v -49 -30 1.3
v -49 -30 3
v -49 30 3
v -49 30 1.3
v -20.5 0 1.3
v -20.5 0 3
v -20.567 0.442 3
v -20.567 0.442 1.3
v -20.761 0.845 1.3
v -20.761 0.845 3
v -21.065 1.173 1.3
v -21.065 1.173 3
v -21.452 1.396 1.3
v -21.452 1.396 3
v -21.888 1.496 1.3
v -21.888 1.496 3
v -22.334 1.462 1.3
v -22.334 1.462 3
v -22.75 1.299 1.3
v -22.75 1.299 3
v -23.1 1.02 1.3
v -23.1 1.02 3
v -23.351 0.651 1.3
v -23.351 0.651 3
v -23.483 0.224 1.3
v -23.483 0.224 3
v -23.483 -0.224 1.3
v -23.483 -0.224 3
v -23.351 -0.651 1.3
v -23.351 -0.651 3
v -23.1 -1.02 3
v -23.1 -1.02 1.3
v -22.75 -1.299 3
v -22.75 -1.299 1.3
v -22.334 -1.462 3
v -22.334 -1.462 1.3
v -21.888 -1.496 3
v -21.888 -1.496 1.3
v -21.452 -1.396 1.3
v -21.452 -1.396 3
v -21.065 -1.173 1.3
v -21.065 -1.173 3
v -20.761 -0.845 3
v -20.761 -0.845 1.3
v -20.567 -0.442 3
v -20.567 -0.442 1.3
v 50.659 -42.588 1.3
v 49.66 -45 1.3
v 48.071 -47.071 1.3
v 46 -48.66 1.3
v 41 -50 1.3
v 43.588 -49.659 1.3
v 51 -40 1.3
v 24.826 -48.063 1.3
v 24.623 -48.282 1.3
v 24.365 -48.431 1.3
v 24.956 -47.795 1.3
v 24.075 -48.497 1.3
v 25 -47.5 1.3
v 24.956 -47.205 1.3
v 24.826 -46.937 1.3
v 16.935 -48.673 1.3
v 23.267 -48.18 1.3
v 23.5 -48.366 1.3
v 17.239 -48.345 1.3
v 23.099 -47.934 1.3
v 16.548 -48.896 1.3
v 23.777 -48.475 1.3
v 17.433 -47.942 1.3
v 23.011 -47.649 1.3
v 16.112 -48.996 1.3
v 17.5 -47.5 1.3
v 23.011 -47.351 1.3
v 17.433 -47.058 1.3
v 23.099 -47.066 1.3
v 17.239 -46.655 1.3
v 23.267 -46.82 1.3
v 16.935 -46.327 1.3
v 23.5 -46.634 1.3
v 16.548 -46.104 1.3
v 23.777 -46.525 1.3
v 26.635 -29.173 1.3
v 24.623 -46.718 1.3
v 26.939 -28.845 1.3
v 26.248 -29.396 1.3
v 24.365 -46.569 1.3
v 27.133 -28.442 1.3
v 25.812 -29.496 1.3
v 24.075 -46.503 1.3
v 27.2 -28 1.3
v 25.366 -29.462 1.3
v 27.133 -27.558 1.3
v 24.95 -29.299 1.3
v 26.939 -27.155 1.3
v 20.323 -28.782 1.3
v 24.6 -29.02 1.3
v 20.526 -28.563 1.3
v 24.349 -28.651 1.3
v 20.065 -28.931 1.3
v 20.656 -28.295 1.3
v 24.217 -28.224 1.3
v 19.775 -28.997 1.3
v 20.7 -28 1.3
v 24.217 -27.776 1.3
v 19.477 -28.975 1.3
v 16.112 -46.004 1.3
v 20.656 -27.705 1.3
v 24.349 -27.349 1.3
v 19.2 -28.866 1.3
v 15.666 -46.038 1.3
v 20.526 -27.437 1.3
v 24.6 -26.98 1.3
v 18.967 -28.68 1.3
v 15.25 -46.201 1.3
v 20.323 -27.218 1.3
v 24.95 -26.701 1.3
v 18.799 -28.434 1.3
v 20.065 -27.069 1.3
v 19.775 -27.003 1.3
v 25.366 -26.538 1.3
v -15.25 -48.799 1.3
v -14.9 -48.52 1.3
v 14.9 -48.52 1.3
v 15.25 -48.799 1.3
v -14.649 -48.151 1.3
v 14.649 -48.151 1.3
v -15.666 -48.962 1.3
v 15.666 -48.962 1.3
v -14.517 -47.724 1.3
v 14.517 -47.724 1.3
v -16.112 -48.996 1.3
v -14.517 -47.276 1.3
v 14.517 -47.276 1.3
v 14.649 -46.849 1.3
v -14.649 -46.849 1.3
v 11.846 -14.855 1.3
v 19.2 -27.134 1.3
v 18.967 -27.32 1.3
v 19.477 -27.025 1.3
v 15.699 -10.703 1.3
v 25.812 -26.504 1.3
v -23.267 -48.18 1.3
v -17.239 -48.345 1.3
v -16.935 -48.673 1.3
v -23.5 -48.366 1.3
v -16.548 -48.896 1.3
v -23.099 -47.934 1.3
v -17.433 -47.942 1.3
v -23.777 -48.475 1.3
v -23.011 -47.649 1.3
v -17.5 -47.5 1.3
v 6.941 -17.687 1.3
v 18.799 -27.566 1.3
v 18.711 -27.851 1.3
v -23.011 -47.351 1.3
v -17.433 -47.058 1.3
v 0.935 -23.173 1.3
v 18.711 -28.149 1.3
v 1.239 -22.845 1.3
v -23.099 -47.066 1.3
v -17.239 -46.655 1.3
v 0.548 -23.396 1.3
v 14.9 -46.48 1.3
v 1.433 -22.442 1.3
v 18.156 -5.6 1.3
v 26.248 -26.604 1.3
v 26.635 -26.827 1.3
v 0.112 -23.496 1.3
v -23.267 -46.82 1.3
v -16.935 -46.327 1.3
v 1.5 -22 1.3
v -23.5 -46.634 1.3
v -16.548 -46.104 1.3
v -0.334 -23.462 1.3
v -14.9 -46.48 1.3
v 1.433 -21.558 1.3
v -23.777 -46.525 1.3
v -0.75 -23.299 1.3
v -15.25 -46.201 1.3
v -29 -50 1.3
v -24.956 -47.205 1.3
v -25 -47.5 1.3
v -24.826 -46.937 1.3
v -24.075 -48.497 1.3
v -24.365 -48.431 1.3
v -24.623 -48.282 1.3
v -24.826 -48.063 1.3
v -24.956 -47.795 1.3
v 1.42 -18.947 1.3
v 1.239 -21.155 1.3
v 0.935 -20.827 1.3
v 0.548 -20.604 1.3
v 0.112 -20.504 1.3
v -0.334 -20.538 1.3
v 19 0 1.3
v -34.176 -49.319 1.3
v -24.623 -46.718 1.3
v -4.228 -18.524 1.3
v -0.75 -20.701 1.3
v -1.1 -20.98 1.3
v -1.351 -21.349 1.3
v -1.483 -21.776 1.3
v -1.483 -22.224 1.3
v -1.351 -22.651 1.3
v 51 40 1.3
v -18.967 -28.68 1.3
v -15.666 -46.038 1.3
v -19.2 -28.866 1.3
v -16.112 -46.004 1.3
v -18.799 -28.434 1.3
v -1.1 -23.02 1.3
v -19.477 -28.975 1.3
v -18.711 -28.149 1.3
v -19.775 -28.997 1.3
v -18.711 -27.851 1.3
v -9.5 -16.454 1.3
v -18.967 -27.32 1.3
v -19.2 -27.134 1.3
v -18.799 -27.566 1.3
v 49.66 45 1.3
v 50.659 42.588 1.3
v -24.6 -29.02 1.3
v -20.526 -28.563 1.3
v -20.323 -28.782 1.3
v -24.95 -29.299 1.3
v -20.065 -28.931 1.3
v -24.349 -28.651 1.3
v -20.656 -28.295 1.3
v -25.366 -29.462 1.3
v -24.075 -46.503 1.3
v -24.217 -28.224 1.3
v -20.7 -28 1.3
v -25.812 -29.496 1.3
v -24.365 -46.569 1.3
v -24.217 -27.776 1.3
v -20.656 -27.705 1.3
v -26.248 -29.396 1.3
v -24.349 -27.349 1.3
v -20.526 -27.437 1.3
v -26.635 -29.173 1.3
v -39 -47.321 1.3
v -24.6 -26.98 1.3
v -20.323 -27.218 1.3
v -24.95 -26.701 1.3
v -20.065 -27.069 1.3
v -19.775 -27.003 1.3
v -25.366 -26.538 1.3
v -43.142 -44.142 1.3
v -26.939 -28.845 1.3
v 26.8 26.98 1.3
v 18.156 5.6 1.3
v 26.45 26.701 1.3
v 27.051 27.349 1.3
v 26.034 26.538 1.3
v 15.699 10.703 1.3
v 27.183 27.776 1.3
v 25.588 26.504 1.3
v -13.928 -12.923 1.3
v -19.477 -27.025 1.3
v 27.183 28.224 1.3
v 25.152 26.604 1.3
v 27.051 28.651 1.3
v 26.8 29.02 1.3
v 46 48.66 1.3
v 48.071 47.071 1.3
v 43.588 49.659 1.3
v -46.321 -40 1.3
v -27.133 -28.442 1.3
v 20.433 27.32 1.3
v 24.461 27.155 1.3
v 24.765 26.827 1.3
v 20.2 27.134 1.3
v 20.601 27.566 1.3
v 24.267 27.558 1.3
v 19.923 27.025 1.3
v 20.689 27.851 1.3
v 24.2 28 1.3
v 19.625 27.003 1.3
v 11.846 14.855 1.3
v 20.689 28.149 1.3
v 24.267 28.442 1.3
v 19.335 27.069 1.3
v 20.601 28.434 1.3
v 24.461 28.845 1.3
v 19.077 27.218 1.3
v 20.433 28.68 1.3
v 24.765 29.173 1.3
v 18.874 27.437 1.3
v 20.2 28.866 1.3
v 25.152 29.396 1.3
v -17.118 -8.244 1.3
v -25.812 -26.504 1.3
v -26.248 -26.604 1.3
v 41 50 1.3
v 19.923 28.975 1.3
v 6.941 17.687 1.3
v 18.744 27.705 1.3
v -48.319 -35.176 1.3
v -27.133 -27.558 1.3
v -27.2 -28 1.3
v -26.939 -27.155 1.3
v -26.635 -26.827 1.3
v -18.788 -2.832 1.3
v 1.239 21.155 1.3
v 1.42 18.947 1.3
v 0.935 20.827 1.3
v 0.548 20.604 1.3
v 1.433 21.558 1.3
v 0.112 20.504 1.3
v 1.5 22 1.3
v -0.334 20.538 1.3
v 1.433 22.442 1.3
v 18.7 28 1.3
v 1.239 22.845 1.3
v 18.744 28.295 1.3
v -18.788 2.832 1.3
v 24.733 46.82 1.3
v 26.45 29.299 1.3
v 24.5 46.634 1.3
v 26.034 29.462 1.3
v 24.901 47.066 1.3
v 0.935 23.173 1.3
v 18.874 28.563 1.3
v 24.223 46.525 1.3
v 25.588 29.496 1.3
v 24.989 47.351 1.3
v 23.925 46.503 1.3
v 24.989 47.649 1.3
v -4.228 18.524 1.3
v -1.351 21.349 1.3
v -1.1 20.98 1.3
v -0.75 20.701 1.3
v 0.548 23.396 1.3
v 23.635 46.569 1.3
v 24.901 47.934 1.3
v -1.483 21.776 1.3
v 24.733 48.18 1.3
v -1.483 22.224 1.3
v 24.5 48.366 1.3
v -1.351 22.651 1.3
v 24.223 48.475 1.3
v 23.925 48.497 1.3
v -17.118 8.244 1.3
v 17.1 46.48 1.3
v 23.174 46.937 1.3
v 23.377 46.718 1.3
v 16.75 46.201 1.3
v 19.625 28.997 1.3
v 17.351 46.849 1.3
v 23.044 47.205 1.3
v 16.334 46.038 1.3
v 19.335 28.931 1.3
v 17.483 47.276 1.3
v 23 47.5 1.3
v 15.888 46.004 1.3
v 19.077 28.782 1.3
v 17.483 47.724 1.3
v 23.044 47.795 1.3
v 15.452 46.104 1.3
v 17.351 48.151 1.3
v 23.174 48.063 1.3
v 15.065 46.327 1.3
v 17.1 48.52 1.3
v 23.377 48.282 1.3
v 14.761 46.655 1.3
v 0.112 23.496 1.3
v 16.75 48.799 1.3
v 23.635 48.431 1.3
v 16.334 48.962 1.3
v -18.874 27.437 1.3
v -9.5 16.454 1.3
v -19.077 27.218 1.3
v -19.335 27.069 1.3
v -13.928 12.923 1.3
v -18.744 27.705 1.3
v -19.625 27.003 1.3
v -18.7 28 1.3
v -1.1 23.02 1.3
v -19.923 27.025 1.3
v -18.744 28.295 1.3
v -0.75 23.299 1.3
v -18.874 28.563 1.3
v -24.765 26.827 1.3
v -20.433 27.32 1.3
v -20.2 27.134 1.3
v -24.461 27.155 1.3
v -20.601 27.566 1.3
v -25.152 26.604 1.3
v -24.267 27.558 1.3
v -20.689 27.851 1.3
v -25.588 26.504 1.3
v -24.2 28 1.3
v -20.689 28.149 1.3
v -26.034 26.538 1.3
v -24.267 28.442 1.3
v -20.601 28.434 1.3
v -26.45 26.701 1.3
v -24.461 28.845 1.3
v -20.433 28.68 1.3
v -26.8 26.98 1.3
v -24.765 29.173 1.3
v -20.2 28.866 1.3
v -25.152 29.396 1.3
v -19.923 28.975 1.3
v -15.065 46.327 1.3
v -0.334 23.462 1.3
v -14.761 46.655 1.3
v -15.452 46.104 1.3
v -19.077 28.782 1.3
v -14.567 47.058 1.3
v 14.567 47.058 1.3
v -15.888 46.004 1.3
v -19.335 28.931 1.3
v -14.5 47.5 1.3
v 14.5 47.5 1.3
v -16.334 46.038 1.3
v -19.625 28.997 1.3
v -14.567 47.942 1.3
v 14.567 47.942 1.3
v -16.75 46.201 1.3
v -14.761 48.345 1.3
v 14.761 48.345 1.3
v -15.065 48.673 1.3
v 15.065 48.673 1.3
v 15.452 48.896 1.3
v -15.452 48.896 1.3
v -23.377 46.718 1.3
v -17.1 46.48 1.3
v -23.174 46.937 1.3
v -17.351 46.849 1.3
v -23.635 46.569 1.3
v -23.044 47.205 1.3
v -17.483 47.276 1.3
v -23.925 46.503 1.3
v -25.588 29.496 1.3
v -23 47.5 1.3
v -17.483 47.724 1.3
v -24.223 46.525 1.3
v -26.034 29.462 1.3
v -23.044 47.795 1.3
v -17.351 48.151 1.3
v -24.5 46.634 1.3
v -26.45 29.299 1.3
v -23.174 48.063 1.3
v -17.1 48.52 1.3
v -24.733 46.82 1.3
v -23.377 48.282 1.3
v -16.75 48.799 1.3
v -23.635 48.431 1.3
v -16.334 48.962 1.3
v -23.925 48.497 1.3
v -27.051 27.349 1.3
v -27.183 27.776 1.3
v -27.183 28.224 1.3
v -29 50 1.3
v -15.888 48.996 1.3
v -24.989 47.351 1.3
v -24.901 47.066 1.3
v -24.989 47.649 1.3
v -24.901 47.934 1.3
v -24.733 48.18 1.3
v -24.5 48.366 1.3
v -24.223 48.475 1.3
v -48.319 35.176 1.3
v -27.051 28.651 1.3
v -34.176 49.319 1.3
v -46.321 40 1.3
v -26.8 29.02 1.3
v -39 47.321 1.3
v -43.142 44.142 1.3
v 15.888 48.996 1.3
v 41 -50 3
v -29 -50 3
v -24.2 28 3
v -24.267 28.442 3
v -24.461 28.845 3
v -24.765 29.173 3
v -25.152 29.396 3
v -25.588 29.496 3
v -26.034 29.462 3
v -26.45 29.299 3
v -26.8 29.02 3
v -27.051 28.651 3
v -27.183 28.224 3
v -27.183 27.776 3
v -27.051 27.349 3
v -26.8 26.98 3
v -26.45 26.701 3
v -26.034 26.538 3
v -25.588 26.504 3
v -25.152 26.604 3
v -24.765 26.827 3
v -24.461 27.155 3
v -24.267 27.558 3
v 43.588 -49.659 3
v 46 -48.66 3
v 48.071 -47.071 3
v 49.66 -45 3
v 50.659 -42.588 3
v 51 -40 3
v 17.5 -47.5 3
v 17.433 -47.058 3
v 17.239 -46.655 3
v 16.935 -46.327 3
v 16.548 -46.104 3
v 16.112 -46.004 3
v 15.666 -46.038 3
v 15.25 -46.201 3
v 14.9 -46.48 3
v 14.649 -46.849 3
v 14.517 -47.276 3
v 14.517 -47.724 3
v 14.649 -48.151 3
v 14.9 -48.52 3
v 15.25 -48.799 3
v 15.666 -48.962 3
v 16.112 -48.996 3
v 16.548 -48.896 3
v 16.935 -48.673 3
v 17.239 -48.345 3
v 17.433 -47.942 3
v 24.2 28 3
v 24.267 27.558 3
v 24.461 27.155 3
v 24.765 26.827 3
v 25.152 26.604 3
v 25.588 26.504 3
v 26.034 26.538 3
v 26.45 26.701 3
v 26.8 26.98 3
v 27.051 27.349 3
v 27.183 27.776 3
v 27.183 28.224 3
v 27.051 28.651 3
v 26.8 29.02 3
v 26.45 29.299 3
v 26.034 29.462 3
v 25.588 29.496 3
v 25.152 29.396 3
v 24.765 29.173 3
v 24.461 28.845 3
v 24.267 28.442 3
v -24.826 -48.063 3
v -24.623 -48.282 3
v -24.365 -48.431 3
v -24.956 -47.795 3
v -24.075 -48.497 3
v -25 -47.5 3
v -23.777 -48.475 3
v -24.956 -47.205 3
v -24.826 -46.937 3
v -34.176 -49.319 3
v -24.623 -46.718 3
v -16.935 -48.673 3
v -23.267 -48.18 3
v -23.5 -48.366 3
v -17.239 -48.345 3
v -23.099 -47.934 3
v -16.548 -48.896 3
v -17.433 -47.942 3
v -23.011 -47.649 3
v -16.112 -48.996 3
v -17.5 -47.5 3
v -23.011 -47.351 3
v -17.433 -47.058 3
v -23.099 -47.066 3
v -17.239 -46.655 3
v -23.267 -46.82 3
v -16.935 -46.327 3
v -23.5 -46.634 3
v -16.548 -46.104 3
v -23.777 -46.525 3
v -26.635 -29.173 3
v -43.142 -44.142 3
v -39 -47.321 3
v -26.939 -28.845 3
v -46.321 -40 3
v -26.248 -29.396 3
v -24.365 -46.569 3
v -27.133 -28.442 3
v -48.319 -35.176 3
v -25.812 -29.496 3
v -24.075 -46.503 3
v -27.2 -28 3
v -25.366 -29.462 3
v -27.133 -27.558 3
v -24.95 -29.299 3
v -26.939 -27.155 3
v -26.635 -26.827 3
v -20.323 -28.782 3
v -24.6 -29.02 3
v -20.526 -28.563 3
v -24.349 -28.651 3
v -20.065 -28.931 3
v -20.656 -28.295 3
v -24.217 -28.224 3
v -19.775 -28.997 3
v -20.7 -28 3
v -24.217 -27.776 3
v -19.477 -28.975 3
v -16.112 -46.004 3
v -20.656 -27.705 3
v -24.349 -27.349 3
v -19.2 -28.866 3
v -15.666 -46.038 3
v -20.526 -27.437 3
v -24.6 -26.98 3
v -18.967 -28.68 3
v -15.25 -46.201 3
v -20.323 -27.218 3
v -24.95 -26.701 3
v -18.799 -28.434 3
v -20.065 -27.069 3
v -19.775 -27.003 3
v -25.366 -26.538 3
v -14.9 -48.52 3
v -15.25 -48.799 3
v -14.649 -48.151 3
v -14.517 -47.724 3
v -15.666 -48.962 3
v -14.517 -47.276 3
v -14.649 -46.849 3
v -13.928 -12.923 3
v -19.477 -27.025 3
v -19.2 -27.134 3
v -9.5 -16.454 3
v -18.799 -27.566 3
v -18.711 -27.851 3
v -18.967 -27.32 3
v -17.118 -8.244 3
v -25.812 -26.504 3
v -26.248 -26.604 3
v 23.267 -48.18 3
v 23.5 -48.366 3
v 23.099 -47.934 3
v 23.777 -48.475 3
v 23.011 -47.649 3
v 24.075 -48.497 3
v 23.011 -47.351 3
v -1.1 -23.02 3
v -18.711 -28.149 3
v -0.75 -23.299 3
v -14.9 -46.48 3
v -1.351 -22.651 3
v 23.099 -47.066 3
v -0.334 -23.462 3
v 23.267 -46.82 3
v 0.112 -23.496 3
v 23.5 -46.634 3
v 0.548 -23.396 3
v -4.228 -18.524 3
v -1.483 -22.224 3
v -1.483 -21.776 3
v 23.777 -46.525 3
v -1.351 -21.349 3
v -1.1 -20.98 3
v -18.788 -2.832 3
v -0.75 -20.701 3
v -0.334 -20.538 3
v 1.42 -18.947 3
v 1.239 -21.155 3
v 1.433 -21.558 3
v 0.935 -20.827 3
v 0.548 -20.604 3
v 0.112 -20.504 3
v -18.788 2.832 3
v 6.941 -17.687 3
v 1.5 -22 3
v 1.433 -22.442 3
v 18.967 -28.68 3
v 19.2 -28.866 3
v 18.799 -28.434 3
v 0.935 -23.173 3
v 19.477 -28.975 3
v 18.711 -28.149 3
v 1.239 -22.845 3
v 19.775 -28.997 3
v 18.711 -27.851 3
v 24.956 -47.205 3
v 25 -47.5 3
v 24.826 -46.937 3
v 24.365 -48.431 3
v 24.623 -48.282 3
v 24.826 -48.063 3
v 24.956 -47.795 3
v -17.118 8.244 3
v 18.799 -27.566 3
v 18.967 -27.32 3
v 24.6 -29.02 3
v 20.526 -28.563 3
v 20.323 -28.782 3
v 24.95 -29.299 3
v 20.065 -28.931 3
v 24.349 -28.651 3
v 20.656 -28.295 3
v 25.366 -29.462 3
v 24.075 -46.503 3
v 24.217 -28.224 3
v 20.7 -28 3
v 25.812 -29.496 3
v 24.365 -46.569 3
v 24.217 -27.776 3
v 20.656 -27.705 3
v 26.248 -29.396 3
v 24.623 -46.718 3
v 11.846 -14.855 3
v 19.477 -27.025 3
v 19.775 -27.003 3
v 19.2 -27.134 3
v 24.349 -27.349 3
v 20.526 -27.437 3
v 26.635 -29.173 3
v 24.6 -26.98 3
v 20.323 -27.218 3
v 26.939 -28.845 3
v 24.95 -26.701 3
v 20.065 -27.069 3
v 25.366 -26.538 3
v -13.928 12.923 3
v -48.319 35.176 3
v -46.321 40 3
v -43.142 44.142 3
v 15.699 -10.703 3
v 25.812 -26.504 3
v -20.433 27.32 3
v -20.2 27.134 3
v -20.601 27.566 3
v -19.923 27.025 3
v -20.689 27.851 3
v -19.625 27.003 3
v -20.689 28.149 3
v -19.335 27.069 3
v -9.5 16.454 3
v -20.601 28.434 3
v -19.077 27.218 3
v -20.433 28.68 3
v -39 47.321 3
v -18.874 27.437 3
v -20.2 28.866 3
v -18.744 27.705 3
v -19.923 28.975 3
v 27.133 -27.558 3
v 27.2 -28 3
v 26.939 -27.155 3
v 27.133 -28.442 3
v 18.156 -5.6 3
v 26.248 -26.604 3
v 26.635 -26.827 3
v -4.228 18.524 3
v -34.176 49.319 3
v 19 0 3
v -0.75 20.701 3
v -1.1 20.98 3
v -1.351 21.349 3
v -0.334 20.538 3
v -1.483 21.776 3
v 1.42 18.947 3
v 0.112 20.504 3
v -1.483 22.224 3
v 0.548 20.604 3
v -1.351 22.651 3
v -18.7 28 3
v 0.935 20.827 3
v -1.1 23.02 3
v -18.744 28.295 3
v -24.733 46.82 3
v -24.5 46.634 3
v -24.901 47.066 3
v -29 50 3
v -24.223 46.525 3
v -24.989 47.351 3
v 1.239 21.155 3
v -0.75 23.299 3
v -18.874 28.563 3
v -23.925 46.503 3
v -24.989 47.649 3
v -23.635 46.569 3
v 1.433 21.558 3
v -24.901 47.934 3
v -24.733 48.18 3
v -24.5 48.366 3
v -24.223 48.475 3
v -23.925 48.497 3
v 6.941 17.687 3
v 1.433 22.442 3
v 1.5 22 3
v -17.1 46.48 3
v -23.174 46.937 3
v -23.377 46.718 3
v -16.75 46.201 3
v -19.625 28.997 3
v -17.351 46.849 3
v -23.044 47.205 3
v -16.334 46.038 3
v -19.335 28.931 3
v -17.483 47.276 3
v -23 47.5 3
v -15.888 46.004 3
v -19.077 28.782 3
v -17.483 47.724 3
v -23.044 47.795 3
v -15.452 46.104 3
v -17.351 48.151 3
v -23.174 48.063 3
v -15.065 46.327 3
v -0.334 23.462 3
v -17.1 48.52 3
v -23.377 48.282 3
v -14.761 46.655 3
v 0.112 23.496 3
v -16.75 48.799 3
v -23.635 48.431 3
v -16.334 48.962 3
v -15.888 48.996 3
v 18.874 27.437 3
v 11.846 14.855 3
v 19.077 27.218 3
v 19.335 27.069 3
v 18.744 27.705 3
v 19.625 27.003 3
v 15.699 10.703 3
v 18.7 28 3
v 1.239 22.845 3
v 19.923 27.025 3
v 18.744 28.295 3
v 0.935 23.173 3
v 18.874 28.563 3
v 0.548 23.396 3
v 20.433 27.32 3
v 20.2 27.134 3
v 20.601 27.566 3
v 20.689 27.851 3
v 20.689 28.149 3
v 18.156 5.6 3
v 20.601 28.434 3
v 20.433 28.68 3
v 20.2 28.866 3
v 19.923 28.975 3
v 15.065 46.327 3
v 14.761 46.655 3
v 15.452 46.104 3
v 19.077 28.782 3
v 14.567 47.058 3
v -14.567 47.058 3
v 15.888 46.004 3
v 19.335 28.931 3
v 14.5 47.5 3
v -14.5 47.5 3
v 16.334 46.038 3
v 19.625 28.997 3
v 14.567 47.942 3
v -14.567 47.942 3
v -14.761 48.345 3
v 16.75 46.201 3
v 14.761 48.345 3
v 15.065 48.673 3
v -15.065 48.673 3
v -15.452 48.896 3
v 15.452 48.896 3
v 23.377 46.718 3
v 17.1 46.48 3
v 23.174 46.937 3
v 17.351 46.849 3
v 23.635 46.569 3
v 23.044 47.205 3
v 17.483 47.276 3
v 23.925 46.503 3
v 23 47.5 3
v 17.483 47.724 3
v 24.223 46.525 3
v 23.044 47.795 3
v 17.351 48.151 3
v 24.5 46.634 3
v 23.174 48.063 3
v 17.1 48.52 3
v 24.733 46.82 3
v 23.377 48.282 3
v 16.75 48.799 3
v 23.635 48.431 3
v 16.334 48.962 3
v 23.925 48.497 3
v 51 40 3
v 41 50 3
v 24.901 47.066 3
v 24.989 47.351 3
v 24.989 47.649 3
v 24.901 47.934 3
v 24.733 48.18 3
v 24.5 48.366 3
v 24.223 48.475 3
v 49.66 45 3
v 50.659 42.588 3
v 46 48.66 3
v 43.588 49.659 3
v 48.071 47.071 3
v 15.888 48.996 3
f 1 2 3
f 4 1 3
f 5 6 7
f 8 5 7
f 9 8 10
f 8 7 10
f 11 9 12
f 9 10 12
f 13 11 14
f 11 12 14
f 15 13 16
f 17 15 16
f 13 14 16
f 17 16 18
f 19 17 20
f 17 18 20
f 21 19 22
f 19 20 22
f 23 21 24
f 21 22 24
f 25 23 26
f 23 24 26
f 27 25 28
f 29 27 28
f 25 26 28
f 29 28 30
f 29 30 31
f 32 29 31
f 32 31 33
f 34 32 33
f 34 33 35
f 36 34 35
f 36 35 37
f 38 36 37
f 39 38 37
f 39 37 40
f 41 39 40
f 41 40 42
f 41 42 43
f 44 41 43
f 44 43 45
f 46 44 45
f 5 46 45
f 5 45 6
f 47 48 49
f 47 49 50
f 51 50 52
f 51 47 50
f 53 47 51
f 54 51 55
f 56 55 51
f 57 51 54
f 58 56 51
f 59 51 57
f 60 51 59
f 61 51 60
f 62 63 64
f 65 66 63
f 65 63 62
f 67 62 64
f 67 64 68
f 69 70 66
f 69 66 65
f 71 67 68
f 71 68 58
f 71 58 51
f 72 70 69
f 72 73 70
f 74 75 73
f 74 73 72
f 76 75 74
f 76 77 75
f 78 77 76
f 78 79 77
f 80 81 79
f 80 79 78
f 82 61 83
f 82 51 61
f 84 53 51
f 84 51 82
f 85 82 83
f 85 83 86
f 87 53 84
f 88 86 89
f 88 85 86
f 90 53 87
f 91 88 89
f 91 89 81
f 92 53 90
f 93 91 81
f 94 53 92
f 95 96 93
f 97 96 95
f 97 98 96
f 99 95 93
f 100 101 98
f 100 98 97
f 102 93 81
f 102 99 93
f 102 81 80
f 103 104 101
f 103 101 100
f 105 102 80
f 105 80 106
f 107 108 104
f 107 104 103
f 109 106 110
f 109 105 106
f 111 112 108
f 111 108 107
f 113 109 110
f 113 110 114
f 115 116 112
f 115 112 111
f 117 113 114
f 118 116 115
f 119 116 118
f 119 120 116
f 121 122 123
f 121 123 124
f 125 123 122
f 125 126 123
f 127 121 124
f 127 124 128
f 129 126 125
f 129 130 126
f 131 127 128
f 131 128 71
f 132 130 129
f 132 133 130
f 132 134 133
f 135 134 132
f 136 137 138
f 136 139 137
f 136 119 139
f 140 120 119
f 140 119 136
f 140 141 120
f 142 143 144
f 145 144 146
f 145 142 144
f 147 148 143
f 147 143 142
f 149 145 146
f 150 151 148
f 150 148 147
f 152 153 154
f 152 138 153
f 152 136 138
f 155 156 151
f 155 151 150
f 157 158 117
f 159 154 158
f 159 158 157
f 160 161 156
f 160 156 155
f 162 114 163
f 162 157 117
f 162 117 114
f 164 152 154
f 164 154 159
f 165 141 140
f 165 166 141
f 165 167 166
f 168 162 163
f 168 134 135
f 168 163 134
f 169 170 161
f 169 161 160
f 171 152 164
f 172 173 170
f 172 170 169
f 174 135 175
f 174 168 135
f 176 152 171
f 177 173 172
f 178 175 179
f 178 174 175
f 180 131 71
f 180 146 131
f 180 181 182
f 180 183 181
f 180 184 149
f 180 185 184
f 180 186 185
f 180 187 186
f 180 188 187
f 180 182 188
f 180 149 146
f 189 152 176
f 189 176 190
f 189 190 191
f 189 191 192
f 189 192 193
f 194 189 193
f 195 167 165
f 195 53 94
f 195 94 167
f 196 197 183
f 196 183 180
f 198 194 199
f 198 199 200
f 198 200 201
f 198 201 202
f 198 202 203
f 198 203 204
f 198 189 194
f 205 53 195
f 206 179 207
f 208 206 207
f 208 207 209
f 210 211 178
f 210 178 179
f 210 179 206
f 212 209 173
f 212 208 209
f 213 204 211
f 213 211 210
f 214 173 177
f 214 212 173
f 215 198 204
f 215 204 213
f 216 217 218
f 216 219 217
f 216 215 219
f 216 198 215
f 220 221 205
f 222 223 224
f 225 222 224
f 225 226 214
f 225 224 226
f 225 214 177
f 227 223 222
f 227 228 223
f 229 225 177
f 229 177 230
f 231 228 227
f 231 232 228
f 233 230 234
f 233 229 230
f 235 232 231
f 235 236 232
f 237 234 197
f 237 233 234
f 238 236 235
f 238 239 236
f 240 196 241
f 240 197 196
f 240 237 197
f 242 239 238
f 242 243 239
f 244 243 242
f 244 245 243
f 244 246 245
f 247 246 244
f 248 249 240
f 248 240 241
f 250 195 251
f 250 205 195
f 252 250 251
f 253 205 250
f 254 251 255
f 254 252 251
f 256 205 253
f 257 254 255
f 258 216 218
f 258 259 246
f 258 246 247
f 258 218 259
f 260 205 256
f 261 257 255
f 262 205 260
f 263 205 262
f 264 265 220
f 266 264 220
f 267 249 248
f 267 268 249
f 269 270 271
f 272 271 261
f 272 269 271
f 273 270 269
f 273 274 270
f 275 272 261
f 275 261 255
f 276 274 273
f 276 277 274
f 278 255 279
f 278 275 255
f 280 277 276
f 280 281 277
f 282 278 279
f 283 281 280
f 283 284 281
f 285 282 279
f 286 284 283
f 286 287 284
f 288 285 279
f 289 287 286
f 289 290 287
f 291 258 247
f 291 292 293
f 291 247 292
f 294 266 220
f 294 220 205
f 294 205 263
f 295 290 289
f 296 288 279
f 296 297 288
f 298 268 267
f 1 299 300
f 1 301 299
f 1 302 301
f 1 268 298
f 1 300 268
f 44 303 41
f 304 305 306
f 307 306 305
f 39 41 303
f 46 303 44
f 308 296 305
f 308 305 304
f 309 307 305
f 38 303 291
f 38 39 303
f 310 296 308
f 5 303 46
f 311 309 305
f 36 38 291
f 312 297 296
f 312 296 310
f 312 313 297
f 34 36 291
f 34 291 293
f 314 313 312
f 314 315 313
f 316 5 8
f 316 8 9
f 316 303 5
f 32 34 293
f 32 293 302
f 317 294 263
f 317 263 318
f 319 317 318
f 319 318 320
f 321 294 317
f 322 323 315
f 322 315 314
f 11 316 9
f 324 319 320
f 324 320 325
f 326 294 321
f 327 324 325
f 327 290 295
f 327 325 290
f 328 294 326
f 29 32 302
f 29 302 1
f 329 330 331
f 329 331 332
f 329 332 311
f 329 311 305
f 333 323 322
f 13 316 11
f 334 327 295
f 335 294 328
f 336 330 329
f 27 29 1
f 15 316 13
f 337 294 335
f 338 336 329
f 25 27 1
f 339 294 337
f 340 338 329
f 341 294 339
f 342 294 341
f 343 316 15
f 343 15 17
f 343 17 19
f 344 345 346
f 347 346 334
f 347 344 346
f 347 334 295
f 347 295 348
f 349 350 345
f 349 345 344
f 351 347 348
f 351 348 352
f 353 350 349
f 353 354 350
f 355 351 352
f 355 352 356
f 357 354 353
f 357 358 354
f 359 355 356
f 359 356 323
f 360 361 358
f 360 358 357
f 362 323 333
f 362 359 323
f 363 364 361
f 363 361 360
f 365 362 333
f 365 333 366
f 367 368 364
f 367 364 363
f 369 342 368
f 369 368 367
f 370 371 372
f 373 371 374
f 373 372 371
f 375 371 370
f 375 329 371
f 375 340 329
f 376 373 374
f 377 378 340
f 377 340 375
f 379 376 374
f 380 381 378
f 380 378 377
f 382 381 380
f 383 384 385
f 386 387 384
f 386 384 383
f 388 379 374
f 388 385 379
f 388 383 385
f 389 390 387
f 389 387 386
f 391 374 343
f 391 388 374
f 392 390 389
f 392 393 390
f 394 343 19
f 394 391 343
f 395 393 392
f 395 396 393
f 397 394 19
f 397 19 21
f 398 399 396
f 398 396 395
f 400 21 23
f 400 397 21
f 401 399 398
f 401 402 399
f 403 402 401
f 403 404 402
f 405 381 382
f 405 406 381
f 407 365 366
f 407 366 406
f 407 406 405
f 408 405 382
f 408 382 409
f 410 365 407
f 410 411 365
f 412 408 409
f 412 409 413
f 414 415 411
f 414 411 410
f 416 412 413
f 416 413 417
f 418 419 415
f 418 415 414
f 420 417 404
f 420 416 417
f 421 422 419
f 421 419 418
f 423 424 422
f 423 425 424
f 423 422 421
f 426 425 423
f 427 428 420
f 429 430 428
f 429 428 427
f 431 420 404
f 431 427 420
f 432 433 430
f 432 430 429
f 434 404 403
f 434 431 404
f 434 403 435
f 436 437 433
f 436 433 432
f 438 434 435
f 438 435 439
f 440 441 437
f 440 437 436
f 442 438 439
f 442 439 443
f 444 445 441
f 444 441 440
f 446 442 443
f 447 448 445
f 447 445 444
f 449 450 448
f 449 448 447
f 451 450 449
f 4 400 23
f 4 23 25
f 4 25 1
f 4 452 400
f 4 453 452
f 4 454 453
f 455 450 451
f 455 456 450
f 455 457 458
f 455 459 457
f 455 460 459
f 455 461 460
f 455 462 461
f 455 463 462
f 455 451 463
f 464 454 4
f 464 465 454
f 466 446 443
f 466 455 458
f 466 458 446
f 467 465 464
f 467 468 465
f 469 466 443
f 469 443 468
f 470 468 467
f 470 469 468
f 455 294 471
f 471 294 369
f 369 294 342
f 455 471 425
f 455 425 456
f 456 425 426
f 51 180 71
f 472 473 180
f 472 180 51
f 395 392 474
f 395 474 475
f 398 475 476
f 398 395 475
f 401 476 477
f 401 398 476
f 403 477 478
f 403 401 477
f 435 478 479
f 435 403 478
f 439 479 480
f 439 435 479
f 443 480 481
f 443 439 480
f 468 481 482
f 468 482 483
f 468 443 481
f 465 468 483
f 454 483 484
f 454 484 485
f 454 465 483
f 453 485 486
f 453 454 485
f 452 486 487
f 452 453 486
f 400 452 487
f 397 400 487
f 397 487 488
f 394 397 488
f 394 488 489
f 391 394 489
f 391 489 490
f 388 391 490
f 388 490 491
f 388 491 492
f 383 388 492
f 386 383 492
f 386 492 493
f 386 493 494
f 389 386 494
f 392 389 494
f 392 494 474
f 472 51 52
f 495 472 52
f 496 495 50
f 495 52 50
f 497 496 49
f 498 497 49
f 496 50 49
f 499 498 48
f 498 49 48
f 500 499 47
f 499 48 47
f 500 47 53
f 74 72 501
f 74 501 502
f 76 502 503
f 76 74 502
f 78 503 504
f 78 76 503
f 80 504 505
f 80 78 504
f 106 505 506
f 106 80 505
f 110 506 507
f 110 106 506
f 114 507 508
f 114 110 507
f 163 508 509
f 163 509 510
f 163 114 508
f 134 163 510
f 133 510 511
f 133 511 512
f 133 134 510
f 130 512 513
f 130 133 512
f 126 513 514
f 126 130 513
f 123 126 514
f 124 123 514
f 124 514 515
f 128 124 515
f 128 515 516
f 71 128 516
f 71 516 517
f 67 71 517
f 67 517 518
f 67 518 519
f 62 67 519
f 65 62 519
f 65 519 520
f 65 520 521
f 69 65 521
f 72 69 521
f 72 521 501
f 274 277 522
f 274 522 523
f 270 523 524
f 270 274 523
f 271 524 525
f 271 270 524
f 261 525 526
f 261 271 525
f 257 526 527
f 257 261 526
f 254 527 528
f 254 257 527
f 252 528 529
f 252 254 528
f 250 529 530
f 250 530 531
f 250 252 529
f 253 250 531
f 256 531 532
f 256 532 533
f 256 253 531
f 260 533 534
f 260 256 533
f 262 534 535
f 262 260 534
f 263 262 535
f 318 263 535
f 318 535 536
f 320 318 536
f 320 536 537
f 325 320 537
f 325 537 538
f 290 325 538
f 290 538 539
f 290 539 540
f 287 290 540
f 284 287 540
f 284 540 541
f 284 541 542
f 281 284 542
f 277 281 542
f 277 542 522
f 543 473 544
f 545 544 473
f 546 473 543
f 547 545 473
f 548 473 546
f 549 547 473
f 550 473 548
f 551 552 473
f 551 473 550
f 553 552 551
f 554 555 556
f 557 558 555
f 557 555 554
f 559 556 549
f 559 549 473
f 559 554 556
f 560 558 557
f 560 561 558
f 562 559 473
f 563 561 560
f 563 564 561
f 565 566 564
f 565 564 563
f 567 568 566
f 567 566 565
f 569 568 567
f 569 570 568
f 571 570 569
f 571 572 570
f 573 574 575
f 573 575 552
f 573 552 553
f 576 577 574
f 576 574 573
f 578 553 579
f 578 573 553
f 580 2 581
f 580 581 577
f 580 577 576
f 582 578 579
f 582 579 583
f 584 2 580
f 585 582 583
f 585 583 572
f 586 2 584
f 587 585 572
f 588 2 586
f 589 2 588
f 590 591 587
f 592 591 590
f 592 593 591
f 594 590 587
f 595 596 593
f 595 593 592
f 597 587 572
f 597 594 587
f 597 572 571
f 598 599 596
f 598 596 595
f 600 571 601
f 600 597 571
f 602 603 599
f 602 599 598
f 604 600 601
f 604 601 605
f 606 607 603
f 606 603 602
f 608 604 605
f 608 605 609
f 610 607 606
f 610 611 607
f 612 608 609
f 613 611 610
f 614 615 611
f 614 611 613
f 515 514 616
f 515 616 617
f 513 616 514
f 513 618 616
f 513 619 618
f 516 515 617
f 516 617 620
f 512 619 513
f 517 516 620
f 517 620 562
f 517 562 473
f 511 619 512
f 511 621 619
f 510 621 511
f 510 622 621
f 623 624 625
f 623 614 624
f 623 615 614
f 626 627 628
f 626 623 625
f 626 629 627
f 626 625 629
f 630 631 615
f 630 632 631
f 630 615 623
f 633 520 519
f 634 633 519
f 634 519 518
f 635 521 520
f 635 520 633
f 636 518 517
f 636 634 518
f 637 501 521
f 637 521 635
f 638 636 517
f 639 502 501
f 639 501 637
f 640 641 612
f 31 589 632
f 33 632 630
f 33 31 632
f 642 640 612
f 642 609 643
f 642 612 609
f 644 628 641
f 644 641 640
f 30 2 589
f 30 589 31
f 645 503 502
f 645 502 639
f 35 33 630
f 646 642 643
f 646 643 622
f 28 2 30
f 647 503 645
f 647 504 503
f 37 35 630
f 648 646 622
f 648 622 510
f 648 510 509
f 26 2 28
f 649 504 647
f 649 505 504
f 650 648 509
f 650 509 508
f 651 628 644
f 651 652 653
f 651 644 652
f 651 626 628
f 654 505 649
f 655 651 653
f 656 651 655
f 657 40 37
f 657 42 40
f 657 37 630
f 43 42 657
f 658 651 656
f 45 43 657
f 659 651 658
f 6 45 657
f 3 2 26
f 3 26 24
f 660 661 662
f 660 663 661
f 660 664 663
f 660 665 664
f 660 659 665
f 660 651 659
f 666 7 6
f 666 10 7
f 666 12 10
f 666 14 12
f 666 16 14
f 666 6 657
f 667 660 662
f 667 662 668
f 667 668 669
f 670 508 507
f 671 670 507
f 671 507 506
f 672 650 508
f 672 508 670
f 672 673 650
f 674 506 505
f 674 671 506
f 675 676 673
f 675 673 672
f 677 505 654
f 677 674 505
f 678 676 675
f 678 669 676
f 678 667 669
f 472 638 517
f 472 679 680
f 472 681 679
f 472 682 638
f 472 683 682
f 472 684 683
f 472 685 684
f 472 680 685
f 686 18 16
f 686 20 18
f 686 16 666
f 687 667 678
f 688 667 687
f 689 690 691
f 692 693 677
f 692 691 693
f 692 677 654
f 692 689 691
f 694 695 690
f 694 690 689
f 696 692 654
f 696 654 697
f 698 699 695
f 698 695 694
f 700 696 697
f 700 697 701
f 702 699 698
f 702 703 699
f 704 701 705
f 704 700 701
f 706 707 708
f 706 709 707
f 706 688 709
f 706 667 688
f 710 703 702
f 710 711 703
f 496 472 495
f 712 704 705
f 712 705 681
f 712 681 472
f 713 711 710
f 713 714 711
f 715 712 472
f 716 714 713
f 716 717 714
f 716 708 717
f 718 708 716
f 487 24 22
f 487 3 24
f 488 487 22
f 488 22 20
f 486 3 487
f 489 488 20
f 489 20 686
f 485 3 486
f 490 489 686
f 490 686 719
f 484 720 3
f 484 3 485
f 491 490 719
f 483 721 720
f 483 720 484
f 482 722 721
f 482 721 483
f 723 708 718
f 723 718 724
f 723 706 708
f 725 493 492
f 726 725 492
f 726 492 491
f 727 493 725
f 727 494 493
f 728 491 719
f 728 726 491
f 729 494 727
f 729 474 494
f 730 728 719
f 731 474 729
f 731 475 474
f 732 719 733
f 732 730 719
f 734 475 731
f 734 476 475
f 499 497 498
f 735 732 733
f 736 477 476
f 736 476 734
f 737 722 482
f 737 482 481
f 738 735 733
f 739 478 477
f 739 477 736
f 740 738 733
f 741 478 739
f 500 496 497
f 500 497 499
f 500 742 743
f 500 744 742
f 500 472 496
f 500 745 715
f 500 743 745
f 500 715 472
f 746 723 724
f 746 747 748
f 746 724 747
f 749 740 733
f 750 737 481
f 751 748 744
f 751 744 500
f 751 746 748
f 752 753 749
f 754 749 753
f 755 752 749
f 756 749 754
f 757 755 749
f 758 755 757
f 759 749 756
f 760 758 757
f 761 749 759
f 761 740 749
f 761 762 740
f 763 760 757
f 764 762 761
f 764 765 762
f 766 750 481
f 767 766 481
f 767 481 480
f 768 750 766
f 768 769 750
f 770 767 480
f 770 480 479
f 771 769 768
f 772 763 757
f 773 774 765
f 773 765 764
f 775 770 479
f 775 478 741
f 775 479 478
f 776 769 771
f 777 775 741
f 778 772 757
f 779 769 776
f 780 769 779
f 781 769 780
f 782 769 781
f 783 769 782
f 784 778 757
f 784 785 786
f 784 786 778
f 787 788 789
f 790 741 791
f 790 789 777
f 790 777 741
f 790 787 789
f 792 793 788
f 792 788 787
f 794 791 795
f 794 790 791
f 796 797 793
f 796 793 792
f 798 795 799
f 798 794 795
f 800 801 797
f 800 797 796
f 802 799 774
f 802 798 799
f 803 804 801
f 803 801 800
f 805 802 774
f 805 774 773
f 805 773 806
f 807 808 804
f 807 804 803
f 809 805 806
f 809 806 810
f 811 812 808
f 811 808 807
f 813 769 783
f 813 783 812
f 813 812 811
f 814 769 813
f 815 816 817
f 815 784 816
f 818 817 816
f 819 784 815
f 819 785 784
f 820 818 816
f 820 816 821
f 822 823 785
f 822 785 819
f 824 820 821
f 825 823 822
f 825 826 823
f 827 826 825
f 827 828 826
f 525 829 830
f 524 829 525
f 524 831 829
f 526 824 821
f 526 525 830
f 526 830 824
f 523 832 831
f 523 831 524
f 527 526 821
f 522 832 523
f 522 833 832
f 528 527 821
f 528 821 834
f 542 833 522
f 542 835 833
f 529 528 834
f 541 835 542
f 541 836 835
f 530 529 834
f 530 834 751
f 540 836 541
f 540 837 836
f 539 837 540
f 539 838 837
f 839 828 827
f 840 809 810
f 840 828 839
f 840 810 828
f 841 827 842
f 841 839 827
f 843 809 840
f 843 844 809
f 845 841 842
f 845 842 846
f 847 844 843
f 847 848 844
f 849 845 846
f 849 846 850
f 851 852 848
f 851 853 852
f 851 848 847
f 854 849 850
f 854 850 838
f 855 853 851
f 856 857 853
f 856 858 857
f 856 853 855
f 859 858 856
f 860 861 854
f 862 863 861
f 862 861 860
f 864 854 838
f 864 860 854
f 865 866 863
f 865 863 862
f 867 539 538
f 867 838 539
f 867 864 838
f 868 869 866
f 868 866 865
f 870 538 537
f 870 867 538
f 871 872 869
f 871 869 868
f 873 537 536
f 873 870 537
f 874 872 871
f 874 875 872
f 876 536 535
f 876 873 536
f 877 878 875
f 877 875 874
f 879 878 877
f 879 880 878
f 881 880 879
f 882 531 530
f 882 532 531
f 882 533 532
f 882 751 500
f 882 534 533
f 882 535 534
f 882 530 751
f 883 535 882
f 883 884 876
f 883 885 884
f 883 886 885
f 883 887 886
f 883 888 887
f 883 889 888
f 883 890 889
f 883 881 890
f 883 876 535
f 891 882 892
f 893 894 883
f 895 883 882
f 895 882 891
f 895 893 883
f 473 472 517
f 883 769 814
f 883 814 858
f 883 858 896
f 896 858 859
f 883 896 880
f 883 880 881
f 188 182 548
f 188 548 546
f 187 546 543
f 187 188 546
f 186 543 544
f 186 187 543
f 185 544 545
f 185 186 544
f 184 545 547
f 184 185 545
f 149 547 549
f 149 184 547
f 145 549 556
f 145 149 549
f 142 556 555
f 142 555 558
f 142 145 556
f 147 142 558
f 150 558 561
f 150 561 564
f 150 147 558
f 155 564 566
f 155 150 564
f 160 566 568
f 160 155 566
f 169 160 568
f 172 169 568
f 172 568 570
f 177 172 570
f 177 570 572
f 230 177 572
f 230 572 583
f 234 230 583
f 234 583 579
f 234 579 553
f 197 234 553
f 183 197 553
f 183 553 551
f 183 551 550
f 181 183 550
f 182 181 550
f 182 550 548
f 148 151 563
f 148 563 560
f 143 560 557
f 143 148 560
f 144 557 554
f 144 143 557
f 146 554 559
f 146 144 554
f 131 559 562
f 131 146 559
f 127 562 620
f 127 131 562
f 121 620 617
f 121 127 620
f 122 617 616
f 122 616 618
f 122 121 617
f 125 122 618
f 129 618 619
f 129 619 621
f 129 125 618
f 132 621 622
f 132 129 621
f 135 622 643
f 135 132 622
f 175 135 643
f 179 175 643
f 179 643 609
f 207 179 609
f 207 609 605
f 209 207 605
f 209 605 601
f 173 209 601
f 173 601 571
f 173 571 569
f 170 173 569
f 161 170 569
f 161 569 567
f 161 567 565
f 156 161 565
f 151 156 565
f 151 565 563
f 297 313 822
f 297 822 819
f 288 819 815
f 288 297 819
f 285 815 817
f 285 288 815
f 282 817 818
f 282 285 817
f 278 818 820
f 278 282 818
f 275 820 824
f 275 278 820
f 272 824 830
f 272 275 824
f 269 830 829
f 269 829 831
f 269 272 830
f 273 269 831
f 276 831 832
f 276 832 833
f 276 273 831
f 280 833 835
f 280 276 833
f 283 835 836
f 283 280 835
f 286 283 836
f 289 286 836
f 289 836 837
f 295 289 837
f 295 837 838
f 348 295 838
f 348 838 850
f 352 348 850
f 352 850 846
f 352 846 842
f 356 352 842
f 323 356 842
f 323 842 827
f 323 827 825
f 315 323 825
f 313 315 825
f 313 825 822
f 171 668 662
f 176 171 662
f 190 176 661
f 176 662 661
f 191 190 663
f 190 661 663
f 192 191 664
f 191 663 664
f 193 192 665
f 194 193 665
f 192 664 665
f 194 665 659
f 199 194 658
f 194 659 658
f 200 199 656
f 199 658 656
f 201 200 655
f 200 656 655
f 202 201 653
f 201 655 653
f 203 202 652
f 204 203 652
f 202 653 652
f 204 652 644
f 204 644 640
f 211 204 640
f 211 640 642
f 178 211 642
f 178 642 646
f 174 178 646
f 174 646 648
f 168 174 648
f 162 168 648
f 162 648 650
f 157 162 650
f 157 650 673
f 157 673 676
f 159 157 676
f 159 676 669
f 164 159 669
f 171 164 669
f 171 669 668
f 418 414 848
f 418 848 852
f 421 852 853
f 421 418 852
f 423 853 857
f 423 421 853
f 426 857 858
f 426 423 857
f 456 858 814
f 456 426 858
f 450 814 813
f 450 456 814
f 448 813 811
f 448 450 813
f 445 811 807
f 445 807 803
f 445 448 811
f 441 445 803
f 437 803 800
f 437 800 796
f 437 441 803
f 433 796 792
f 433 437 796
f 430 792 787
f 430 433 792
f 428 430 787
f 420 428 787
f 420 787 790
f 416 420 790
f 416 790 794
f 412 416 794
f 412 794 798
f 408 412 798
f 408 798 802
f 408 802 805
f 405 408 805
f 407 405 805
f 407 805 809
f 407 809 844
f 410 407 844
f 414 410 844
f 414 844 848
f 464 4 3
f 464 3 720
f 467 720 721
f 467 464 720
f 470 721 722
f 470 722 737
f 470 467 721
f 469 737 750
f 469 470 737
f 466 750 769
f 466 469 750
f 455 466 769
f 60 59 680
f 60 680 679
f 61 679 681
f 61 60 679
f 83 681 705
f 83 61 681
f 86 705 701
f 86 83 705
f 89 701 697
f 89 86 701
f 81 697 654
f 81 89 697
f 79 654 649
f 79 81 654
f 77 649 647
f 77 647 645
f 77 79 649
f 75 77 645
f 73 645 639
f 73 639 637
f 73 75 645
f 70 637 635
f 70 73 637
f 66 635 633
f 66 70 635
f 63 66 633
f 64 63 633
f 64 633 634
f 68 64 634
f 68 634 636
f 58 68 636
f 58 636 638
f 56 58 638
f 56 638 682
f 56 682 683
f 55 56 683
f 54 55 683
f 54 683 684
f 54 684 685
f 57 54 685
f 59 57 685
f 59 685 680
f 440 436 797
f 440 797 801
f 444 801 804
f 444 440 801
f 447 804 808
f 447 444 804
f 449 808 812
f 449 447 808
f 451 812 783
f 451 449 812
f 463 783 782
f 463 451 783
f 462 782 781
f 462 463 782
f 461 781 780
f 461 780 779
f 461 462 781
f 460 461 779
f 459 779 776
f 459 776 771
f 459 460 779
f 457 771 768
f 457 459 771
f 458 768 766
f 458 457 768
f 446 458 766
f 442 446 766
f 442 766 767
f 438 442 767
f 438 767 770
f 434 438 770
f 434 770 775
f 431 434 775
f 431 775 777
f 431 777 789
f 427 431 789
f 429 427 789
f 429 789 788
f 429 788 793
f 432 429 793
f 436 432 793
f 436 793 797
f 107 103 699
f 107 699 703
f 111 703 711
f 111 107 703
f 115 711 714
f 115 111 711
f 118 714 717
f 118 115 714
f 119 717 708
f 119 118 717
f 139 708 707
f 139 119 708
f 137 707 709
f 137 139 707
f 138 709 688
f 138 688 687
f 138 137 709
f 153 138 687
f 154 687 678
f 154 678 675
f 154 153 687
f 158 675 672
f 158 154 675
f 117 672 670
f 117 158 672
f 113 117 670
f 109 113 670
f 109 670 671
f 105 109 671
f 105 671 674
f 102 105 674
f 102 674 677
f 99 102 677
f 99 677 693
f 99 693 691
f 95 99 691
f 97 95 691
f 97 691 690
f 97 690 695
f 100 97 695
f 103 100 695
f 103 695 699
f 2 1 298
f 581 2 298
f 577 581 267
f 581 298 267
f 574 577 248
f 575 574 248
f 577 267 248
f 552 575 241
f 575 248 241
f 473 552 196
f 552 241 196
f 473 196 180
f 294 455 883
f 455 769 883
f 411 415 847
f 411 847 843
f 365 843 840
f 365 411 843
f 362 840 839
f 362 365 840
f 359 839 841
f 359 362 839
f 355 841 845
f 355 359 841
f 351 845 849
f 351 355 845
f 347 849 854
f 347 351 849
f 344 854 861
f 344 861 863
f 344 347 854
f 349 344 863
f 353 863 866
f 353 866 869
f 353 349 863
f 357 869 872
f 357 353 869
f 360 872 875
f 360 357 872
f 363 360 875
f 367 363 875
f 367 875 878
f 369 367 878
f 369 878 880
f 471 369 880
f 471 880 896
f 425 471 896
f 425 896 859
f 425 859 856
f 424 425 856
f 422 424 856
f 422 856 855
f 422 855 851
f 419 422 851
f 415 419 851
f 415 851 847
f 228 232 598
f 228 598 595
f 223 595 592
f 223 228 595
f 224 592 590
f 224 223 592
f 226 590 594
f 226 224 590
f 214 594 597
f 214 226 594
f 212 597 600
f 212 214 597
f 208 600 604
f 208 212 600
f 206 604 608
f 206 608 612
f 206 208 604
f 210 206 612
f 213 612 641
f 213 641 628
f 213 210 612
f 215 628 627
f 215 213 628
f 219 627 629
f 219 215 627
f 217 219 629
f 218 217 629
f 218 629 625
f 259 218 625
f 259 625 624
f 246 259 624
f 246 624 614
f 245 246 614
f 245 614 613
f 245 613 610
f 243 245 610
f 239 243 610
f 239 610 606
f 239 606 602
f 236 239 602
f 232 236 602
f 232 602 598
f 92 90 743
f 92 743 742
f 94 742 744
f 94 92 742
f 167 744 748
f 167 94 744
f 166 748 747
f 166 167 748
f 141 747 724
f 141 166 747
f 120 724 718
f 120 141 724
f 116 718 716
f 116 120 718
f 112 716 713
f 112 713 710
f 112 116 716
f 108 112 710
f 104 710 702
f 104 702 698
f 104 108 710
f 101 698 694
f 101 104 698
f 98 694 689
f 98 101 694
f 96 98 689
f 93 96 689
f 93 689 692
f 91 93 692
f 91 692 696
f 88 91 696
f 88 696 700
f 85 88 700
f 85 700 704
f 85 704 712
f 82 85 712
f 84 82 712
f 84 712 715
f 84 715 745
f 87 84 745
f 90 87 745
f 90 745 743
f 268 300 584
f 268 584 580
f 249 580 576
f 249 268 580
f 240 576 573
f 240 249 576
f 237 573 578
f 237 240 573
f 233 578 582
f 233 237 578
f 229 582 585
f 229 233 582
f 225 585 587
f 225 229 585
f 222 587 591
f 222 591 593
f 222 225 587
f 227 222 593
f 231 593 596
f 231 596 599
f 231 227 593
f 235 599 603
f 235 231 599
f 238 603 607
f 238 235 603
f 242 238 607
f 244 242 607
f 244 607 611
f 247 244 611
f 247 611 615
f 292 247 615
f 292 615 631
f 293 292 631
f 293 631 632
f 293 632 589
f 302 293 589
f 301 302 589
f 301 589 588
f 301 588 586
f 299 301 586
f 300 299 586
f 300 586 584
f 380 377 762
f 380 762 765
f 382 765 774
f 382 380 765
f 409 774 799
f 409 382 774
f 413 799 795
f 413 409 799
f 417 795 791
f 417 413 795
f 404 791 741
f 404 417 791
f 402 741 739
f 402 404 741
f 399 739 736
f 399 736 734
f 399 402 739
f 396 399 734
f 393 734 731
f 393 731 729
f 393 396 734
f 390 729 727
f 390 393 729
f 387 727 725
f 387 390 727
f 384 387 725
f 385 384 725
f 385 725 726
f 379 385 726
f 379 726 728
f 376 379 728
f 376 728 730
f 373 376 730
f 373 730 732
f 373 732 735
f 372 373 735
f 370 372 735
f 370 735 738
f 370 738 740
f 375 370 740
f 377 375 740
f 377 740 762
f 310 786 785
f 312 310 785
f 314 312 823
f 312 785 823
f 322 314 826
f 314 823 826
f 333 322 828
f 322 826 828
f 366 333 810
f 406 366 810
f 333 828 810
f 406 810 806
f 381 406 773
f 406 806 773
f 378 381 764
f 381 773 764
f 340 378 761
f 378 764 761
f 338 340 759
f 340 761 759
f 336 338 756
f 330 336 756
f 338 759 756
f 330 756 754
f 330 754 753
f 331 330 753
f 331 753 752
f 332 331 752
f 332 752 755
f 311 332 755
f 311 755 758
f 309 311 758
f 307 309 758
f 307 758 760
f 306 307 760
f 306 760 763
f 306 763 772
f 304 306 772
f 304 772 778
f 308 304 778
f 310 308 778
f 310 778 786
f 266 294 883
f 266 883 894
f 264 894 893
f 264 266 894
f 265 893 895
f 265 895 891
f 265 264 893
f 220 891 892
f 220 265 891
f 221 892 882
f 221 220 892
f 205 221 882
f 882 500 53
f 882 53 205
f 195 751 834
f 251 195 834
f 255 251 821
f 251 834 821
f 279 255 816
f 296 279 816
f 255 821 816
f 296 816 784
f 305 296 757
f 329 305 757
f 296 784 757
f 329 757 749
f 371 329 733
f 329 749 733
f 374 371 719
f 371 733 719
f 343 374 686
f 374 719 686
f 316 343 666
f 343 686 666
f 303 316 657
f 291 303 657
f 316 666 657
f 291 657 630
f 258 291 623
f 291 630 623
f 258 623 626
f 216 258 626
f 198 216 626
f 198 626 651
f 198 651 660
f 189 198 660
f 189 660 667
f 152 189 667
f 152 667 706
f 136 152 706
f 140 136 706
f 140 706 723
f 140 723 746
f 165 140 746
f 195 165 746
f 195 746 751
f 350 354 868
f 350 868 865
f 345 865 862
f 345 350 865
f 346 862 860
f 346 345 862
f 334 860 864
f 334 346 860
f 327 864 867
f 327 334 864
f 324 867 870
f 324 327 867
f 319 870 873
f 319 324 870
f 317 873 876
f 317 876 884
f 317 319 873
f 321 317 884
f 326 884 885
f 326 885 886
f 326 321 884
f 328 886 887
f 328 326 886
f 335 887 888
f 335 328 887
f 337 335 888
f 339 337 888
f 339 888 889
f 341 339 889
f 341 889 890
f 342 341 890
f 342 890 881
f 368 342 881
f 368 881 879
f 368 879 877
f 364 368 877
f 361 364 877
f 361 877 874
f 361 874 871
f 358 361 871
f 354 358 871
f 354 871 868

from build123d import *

# Parameters (mm, degrees)
SKETCH_1_W          = 58
SKETCH_1_H          = 100
SKETCH_1_R          = 1
SKETCH_1_R_2        = 1.5
EXTRUDE_1_DEPTH     = 3
SKETCH_2_R          = 19
SKETCH_2_R_2        = 1.5
CUT_EXTRUDE_1_DEPTH = 10
SKETCH_2_3_W        = 20
SKETCH_2_3_H        = 100
SKETCH_2_3_W_2      = 22
EXTRUDE_2_DEPTH     = 3
FILLET_1_R          = 20
FILLET_2_R          = 10
CUT_EXTRUDE_2_DEPTH = 1.3


with BuildPart() as part:
    # 草图1 → 凸台-拉伸1 (new body)
    with BuildSketch(Plane.XY):
        Rectangle(SKETCH_1_W, SKETCH_1_H)
        with Locations((-24, 47.5)):
            Circle(SKETCH_1_R, mode=Mode.SUBTRACT)
        with Locations((-16, 47.5)):
            Circle(SKETCH_1_R_2, mode=Mode.SUBTRACT)
        with Locations((16, 47.5)):
            Circle(SKETCH_1_R_2, mode=Mode.SUBTRACT)
        with Locations((24, 47.5)):
            Circle(SKETCH_1_R, mode=Mode.SUBTRACT)
        with Locations((-19.7, 28)):
            Circle(SKETCH_1_R, mode=Mode.SUBTRACT)
        with Locations((-25.7, 28)):
            Circle(SKETCH_1_R_2, mode=Mode.SUBTRACT)
        with Locations((19.7, 28)):
            Circle(SKETCH_1_R, mode=Mode.SUBTRACT)
        with Locations((25.7, 28)):
            Circle(SKETCH_1_R_2, mode=Mode.SUBTRACT)
        with Locations((25.7, -28)):
            Circle(SKETCH_1_R_2, mode=Mode.SUBTRACT)
        with Locations((24, -47.5)):
            Circle(SKETCH_1_R, mode=Mode.SUBTRACT)
        with Locations((16, -47.5)):
            Circle(SKETCH_1_R_2, mode=Mode.SUBTRACT)
        with Locations((19.7, -28)):
            Circle(SKETCH_1_R, mode=Mode.SUBTRACT)
        with Locations((-19.7, -28)):
            Circle(SKETCH_1_R, mode=Mode.SUBTRACT)
        with Locations((-25.7, -28)):
            Circle(SKETCH_1_R_2, mode=Mode.SUBTRACT)
        with Locations((-24, -47.5)):
            Circle(SKETCH_1_R, mode=Mode.SUBTRACT)
        with Locations((-16, -47.5)):
            Circle(SKETCH_1_R_2, mode=Mode.SUBTRACT)
    extrude(amount=EXTRUDE_1_DEPTH)

    # 草图2 → 切除-拉伸1 (cut)
    with BuildSketch(Plane.XY.offset(3)):
        Circle(SKETCH_2_R)
        with Locations((0, 22)):
            Circle(SKETCH_2_R_2)
        with Locations((-22, 0)):
            Circle(SKETCH_2_R_2)
        with Locations((0, -22)):
            Circle(SKETCH_2_R_2)
    extrude(amount=-CUT_EXTRUDE_1_DEPTH, mode=Mode.SUBTRACT)

    # 草图2<3> → 凸台-拉伸2 (add)
    with BuildSketch(Plane.XY.offset(3)):
        with Locations((-39, 0)):
            Rectangle(SKETCH_2_3_W, SKETCH_2_3_H)
        with Locations((40, 0)):
            Rectangle(SKETCH_2_3_W_2, SKETCH_2_3_H)
    extrude(amount=-EXTRUDE_2_DEPTH)

    # 圆角1
    fillet_1_edges = [part.edges().sort_by_distance(p)[0] for p in [
        (-49, 50, 1.5),
        (-49, -50, 1.5),
    ]]
    fillet(fillet_1_edges, radius=FILLET_1_R)

    # 圆角2
    fillet_2_edges = [part.edges().sort_by_distance(p)[0] for p in [
        (51, 50, 1.5),
        (51, -50, 1.5),
    ]]
    fillet(fillet_2_edges, radius=FILLET_2_R)

    # 草图3 → 切除-拉伸2 (cut)
    with BuildSketch(Plane(origin=(0, 0, 0), x_dir=(-1, 0, 0), z_dir=(0, 0, -1))):
        with BuildLine():
            Line((29, 50), (-41, 50))
            ThreePointArc((-41, 50), (-48.071067812, 47.071067812), (-51, 40))
            Line((-51, 40), (-51, -40))
            ThreePointArc((-51, -40), (-48.071067812, -47.071067812), (-41, -50))
            Line((-41, -50), (29, -50))
            ThreePointArc((29, -50), (43.142135624, -44.142135624), (49, -30))
            Line((49, -30), (49, 30))
            ThreePointArc((49, 30), (43.142135624, 44.142135624), (29, 50))
        make_face()
    extrude(amount=-CUT_EXTRUDE_2_DEPTH, mode=Mode.SUBTRACT)


solid = part.part
